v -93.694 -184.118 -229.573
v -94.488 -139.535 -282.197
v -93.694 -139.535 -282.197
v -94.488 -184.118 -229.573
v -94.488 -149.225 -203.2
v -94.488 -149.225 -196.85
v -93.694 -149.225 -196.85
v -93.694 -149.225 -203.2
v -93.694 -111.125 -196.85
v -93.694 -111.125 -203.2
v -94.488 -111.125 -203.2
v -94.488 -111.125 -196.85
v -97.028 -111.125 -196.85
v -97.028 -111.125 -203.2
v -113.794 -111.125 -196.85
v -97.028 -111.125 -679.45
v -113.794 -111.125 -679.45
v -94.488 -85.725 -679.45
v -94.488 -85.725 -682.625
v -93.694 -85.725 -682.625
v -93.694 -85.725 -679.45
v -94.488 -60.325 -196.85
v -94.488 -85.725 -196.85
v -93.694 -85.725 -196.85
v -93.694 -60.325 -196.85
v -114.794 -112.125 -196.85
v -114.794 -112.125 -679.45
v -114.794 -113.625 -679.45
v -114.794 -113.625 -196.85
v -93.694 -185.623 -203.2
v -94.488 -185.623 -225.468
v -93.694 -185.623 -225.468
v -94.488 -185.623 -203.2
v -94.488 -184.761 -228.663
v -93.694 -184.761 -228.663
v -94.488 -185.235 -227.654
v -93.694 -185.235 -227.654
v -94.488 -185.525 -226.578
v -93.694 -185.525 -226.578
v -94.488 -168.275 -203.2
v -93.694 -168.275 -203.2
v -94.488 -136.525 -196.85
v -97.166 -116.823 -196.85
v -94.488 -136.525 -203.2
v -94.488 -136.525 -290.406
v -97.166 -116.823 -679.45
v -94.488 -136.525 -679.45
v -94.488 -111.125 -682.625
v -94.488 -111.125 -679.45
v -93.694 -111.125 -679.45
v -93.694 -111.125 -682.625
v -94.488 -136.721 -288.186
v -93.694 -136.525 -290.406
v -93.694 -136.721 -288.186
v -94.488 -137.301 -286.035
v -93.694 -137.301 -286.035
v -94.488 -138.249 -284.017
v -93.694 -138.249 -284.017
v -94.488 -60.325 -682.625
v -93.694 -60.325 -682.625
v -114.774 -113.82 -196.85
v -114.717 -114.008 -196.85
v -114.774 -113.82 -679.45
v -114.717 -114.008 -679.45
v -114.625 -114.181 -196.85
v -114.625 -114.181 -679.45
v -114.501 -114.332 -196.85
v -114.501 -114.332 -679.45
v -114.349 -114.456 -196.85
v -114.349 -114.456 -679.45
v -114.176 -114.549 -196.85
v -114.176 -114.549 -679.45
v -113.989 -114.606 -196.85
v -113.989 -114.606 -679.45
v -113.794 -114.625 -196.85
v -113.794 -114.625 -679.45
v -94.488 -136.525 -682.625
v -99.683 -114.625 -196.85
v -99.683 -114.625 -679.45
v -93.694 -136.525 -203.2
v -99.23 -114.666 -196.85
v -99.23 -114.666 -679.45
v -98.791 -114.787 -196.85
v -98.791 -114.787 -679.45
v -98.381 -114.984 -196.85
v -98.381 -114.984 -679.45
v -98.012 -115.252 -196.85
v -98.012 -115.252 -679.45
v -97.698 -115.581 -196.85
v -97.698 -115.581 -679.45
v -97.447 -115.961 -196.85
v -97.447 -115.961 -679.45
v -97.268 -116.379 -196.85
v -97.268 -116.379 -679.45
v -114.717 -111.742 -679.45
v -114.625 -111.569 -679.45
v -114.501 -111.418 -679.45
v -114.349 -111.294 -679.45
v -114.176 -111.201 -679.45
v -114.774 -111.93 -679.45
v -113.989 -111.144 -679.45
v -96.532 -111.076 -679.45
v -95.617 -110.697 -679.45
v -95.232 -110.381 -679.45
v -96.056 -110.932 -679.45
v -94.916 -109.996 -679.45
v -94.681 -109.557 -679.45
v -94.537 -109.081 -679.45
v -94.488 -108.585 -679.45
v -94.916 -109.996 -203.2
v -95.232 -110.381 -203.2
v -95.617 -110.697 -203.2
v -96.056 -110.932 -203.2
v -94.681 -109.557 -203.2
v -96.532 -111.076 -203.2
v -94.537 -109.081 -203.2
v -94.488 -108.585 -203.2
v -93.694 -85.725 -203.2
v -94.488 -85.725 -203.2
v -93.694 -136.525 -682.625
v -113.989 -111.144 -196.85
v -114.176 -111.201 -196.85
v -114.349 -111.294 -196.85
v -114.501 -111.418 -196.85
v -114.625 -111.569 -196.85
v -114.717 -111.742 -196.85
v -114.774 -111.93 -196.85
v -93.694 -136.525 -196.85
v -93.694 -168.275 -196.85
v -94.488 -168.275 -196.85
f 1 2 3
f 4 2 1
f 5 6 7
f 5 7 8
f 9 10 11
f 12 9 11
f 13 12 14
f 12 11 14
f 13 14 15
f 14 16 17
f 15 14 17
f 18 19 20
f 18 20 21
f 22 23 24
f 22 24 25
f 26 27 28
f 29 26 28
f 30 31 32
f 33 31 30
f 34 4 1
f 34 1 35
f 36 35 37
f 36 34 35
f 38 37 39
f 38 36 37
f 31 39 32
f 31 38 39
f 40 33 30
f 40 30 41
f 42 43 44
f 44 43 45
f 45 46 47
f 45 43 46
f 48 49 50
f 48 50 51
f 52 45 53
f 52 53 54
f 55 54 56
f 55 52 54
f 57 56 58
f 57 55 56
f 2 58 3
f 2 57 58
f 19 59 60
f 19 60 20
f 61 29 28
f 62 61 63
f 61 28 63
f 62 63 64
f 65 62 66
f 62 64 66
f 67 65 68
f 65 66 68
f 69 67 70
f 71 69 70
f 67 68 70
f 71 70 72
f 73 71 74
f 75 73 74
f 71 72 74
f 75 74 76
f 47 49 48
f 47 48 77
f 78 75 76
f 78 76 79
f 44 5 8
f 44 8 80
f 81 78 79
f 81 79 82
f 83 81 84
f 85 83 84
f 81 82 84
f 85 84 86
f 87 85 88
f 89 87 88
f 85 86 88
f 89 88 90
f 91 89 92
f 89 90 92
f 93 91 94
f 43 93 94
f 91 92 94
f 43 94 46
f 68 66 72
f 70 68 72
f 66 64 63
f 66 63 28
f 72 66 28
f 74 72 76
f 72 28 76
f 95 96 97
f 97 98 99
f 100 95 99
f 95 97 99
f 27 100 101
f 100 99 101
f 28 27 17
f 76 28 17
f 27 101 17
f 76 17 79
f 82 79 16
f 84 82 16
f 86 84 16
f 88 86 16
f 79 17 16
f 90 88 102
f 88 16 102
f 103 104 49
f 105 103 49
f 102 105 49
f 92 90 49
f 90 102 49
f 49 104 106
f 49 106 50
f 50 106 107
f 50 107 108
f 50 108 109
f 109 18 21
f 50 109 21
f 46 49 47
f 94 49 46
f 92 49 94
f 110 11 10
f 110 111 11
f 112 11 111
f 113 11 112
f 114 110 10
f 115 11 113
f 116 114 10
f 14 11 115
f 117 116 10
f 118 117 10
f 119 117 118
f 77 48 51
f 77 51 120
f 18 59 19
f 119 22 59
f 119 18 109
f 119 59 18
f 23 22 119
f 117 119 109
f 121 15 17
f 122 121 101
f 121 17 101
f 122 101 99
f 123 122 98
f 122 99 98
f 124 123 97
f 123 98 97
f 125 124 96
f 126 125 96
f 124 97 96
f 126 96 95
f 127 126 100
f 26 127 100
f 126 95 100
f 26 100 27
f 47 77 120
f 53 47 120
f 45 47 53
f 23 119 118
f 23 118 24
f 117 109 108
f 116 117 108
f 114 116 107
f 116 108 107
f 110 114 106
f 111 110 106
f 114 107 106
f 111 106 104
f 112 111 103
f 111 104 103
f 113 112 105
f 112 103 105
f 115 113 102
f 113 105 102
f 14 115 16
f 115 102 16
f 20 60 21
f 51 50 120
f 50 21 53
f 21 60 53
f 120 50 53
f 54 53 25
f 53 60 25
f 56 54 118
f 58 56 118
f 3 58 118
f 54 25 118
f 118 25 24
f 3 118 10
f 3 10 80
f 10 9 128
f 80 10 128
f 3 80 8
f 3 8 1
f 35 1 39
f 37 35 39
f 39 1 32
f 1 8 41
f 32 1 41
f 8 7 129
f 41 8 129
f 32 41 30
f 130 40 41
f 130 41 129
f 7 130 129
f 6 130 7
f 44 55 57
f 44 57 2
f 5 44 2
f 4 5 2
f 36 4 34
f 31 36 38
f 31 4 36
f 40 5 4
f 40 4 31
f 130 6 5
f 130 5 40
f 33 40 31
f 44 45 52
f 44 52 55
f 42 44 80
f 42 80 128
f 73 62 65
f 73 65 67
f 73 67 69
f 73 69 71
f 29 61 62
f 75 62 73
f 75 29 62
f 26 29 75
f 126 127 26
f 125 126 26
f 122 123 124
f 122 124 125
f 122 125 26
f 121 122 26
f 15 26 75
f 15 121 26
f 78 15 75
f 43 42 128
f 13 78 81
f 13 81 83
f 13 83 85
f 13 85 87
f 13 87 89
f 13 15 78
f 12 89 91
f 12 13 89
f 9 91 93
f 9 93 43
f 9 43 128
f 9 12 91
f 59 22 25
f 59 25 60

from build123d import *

# Parameters (mm, degrees)
BOSS_EXTRUDE1_DEPTH = 0.79375
BOSS_EXTRUDE2_DEPTH = 482.6
SKETCH5_W           = 30.221142114
SKETCH5_H           = 4.701476641
CUT_EXTRUDE1_DEPTH  = 27.94


with BuildPart() as part:
    # Sketch1 → Boss-Extrude1 (new body)
    with BuildSketch(Plane(origin=(-94.488, 0, 0), x_dir=(0, -1, 0), z_dir=(-1, 0, 0))):
        Polygon((111.125, -196.85), (111.125, -203.2), (85.725, -203.2), (85.725, -196.85), (60.325, -196.85), (60.325, -682.625), (85.725, -682.625), (85.725, -679.45), (111.125, -679.45), (111.125, -682.625), (136.525, -682.625), (136.525, -290.406498707), (136.525, -203.2), (136.525, -196.85), align=None)
        with BuildLine():
            Line((149.225, -203.2), (136.525, -203.2))
            Line((136.525, -203.2), (136.525, -290.406498707))
            ThreePointArc((136.525, -290.406498707), (137.30121982, -286.034603668), (139.534994681, -282.197126202))
            Line((139.534994681, -282.197126202), (184.118202659, -229.57294303))
            ThreePointArc((184.118202659, -229.57294303), (185.23509009, -227.654204297), (185.6232, -225.468256778))
            Line((185.6232, -225.468256778), (185.6232, -203.2))
            Line((185.6232, -203.2), (168.275, -203.2))
            Line((168.275, -203.2), (168.275, -196.85))
            Line((168.275, -196.85), (149.225, -196.85))
            Line((149.225, -196.85), (149.225, -203.2))
        make_face()
    extrude(amount=-BOSS_EXTRUDE1_DEPTH)

    # Sketch4 → Boss-Extrude2 (add)
    with BuildSketch(Plane(origin=(0, 0, -679.45), x_dir=(-1, 0, 0), z_dir=(0, 0, -1))):
        with BuildLine():
            Line((97.166105032, -116.822884411), (94.488, -136.525))
            Line((94.488, -136.525), (94.488, -114.25313135))
            Line((94.488, -114.25313135), (94.488, -111.125))
            Line((94.488, -111.125), (94.488, -108.585))
            ThreePointArc((94.488, -108.585), (95.231948776, -110.381051224), (97.028, -111.125))
            Line((97.028, -111.125), (113.793536469, -111.125))
            ThreePointArc((113.793536469, -111.125), (114.50064325, -111.417893219), (114.793536469, -112.125))
            Line((114.793536469, -112.125), (114.793536469, -113.625))
            ThreePointArc((114.793536469, -113.625), (114.50064325, -114.332106781), (113.793536469, -114.625))
            Line((113.793536469, -114.625), (99.682959601, -114.625))
            ThreePointArc((99.682959601, -114.625), (98.012237242, -115.251812399), (97.166105032, -116.822884411))
        make_face()
    extrude(amount=-BOSS_EXTRUDE2_DEPTH)

    # Sketch5 → Cut-Extrude1 (cut)
    with BuildSketch(Plane(origin=(-93.69425, 0, 0), x_dir=(0, 0, -1), z_dir=(1, 0, 0))):
        with Locations((188.089428943, -108.77426168)):
            Rectangle(SKETCH5_W, SKETCH5_H)
    extrude(amount=-CUT_EXTRUDE1_DEPTH, mode=Mode.SUBTRACT)


solid = part.part
